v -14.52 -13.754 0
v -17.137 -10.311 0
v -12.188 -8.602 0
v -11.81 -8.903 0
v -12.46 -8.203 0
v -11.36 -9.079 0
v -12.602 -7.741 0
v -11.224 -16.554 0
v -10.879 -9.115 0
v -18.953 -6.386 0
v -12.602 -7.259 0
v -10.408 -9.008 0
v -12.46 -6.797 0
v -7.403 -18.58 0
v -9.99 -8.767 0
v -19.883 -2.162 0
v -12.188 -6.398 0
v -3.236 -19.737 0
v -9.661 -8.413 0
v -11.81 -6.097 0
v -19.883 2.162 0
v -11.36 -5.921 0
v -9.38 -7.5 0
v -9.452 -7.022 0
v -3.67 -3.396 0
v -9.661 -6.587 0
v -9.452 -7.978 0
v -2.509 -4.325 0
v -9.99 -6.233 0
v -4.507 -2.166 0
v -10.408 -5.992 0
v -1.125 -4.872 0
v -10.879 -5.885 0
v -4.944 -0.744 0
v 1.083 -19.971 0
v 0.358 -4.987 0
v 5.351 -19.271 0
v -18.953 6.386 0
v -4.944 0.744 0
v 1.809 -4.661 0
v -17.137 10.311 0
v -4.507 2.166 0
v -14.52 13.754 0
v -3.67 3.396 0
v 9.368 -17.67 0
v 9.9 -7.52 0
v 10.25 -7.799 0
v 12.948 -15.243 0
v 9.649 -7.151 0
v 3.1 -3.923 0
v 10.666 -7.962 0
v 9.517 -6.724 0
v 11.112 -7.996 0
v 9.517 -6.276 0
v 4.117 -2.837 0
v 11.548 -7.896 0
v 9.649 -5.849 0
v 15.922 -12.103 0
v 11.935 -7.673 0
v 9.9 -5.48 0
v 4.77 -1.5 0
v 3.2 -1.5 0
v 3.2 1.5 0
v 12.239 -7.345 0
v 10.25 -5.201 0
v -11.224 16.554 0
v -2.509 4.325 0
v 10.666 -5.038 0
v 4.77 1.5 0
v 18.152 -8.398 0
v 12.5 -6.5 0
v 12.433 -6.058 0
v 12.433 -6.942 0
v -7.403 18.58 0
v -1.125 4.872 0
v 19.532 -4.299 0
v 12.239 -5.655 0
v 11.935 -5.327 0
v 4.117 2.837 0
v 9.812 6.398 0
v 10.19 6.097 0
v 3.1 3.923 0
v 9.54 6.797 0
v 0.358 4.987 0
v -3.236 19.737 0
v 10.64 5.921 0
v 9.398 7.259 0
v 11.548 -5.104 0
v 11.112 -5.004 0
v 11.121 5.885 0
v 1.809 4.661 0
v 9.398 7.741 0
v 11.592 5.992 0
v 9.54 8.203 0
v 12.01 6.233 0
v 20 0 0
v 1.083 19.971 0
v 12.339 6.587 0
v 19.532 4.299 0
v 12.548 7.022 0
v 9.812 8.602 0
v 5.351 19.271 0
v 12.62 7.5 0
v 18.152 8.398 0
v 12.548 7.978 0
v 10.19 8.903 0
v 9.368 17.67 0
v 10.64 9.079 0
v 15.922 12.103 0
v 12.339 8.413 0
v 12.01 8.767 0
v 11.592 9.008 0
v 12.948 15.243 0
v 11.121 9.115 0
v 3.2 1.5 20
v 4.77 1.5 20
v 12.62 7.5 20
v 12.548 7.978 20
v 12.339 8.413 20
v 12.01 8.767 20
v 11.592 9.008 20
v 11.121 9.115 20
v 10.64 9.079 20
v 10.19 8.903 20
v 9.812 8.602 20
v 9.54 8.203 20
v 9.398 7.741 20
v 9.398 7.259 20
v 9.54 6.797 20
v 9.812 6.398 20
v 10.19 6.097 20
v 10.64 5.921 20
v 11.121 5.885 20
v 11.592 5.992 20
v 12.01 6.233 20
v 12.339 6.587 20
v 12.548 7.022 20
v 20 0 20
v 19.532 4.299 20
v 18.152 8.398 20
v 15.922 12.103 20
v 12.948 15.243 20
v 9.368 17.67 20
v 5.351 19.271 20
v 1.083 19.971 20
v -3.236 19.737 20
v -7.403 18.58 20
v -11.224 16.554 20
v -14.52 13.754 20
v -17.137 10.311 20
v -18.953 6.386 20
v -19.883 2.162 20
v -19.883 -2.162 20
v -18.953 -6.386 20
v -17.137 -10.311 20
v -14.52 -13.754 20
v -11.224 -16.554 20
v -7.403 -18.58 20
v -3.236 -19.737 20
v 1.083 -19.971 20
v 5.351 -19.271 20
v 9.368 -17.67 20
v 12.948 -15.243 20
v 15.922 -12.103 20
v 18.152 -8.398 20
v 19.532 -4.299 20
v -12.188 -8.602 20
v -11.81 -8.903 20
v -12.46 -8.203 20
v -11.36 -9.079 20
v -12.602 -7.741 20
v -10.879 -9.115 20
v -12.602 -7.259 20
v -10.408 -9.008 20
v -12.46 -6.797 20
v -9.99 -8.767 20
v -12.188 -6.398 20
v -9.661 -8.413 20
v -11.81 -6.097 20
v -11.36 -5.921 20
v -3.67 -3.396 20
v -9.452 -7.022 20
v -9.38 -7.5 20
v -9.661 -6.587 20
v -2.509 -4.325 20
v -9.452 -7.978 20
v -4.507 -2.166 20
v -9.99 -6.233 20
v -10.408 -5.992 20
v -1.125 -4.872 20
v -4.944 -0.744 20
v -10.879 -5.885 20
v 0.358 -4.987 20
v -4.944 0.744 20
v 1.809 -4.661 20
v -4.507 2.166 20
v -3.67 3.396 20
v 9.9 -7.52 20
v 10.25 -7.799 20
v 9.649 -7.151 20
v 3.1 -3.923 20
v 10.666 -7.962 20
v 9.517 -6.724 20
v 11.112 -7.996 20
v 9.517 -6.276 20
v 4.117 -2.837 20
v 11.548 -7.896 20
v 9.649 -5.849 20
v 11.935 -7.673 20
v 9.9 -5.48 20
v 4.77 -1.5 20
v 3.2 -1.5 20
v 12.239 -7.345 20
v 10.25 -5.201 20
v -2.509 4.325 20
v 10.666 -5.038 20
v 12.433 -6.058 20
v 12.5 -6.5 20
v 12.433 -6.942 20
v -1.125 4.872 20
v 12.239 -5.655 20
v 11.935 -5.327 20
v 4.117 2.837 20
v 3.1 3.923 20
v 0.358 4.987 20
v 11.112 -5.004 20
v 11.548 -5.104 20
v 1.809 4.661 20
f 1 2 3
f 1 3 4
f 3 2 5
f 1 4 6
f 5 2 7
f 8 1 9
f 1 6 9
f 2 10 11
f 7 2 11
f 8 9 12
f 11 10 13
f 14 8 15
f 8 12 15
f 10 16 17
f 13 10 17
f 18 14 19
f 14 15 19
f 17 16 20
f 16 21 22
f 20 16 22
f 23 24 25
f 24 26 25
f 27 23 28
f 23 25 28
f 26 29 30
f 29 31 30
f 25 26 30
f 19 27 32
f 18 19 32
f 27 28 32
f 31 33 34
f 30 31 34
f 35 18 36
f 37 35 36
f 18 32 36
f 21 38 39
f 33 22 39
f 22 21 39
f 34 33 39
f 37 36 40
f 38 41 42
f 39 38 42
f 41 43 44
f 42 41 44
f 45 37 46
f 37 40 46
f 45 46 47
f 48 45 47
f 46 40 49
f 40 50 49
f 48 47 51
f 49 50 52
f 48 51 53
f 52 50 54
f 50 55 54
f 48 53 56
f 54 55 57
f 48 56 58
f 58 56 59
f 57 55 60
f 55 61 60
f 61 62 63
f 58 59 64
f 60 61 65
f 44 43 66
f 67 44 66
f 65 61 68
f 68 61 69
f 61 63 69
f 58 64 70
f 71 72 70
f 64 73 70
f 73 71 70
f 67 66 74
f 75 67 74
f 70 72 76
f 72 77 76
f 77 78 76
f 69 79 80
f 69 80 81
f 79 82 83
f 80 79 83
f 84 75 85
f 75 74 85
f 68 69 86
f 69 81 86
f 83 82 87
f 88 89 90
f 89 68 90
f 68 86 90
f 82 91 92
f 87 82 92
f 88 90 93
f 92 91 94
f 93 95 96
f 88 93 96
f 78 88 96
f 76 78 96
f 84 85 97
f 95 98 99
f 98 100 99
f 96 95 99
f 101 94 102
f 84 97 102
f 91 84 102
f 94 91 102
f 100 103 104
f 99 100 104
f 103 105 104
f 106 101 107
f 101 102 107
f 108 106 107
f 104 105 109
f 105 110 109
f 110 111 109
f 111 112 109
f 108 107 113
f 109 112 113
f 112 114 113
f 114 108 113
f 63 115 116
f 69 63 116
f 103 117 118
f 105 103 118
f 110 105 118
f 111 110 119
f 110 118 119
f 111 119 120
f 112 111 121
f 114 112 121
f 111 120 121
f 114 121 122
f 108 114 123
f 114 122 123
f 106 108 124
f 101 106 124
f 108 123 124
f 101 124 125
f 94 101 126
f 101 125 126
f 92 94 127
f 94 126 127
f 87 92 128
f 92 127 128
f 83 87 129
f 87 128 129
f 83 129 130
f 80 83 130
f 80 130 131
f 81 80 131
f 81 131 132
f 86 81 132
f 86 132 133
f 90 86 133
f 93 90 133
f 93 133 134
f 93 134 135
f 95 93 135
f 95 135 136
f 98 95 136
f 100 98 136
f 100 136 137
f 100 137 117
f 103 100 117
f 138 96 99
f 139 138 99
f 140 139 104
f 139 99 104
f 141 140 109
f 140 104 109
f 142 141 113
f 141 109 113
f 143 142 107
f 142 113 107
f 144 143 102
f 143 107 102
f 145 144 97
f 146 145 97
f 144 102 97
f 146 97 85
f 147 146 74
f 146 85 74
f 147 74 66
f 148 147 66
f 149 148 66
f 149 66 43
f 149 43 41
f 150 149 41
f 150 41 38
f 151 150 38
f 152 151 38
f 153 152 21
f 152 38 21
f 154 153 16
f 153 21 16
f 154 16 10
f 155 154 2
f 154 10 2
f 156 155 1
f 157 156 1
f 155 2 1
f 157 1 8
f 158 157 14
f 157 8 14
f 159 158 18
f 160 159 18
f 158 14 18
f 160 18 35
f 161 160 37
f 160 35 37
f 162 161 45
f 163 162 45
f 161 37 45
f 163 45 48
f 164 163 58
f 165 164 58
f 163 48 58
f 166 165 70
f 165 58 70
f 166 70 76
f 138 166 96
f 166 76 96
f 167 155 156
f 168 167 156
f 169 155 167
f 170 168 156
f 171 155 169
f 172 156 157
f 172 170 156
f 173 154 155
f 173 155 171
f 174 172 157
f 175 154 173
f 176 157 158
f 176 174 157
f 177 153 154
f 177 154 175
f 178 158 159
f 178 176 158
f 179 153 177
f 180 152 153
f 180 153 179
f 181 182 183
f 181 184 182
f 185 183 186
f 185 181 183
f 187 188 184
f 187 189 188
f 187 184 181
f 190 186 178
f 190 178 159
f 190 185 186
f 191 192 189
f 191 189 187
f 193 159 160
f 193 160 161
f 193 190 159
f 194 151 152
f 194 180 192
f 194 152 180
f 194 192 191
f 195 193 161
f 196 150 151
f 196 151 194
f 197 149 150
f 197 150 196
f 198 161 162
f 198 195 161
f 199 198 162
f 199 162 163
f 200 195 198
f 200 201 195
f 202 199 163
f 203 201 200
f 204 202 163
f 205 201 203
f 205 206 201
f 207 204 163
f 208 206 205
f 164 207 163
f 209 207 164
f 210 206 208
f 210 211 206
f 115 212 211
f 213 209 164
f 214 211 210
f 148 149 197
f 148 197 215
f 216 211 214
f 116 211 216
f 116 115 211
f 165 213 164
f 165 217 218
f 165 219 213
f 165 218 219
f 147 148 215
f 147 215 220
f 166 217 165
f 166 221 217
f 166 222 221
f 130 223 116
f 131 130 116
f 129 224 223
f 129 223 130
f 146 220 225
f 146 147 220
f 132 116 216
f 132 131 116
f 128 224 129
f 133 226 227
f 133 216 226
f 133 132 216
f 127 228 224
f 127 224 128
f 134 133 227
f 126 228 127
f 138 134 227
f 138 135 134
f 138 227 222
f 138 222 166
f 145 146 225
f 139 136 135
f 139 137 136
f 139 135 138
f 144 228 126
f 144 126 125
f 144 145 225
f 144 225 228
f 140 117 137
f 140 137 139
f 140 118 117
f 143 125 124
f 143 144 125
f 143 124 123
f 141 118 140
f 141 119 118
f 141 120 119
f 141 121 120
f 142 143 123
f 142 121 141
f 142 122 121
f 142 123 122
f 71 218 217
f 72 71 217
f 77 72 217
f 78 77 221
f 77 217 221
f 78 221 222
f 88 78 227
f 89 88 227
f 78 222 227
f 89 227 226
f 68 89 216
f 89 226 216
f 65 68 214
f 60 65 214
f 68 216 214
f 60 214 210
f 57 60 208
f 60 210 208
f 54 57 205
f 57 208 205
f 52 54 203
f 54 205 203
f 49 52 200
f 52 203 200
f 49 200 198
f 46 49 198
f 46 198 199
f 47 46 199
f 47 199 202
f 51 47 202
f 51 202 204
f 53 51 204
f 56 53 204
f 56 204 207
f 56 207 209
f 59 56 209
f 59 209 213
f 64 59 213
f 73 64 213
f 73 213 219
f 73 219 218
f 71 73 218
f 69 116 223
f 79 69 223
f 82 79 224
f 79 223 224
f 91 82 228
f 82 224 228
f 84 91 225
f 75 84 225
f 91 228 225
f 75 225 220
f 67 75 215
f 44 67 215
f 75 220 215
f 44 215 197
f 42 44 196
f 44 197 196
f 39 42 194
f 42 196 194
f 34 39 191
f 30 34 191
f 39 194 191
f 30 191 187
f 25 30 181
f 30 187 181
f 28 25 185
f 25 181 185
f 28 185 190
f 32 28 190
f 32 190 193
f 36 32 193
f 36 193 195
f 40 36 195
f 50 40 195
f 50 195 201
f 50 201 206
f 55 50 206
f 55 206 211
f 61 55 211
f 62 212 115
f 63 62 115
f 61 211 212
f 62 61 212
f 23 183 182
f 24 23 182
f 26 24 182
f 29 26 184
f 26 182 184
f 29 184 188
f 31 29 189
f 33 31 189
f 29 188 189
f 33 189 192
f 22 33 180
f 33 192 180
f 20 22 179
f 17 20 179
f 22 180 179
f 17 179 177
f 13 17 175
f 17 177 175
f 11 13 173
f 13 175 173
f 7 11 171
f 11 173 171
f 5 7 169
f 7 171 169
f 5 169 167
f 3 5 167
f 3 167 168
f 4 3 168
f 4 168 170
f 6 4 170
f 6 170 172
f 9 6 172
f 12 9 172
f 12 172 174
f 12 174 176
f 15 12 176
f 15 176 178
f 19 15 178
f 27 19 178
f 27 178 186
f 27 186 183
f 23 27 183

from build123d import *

# Parameters (mm, degrees)
SKETCH_1_R          = 20
EXTRUDE_1_DEPTH     = 20
CUT_EXTRUDE_1_DEPTH = 22.5
SKETCH_3_R          = 1.62
SKETCH_3_R_2        = 1.5
CUT_EXTRUDE_2_DEPTH = 22.5


with BuildPart() as part:
    # 草图1 → 凸台-拉伸1 (new body)
    with BuildSketch(Plane.XY):
        Circle(SKETCH_1_R)
    extrude(amount=EXTRUDE_1_DEPTH)

    # 草图2 → 切除-拉伸1 (cut)
    with BuildSketch(Plane.XY.offset(20)):
        with BuildLine():
            Line((4.769696007, -1.5), (3.2, -1.5))
            Line((3.2, -1.5), (3.2, 1.5))
            Line((3.2, 1.5), (4.769696007, 1.5))
            ThreePointArc((4.769696007, 1.5), (-5, 0), (4.769696007, -1.5))
        make_face()
    extrude(amount=-CUT_EXTRUDE_1_DEPTH, mode=Mode.SUBTRACT)

    # 草图3 → 切除-拉伸2 (cut)
    with BuildSketch(Plane.XY.offset(20)):
        with Locations((11, 7.5)):
            Circle(SKETCH_3_R)
        with Locations((-11, -7.5)):
            Circle(SKETCH_3_R)
        with Locations((11, -6.5)):
            Circle(SKETCH_3_R_2)
    extrude(amount=-CUT_EXTRUDE_2_DEPTH, mode=Mode.SUBTRACT)


solid = part.part
